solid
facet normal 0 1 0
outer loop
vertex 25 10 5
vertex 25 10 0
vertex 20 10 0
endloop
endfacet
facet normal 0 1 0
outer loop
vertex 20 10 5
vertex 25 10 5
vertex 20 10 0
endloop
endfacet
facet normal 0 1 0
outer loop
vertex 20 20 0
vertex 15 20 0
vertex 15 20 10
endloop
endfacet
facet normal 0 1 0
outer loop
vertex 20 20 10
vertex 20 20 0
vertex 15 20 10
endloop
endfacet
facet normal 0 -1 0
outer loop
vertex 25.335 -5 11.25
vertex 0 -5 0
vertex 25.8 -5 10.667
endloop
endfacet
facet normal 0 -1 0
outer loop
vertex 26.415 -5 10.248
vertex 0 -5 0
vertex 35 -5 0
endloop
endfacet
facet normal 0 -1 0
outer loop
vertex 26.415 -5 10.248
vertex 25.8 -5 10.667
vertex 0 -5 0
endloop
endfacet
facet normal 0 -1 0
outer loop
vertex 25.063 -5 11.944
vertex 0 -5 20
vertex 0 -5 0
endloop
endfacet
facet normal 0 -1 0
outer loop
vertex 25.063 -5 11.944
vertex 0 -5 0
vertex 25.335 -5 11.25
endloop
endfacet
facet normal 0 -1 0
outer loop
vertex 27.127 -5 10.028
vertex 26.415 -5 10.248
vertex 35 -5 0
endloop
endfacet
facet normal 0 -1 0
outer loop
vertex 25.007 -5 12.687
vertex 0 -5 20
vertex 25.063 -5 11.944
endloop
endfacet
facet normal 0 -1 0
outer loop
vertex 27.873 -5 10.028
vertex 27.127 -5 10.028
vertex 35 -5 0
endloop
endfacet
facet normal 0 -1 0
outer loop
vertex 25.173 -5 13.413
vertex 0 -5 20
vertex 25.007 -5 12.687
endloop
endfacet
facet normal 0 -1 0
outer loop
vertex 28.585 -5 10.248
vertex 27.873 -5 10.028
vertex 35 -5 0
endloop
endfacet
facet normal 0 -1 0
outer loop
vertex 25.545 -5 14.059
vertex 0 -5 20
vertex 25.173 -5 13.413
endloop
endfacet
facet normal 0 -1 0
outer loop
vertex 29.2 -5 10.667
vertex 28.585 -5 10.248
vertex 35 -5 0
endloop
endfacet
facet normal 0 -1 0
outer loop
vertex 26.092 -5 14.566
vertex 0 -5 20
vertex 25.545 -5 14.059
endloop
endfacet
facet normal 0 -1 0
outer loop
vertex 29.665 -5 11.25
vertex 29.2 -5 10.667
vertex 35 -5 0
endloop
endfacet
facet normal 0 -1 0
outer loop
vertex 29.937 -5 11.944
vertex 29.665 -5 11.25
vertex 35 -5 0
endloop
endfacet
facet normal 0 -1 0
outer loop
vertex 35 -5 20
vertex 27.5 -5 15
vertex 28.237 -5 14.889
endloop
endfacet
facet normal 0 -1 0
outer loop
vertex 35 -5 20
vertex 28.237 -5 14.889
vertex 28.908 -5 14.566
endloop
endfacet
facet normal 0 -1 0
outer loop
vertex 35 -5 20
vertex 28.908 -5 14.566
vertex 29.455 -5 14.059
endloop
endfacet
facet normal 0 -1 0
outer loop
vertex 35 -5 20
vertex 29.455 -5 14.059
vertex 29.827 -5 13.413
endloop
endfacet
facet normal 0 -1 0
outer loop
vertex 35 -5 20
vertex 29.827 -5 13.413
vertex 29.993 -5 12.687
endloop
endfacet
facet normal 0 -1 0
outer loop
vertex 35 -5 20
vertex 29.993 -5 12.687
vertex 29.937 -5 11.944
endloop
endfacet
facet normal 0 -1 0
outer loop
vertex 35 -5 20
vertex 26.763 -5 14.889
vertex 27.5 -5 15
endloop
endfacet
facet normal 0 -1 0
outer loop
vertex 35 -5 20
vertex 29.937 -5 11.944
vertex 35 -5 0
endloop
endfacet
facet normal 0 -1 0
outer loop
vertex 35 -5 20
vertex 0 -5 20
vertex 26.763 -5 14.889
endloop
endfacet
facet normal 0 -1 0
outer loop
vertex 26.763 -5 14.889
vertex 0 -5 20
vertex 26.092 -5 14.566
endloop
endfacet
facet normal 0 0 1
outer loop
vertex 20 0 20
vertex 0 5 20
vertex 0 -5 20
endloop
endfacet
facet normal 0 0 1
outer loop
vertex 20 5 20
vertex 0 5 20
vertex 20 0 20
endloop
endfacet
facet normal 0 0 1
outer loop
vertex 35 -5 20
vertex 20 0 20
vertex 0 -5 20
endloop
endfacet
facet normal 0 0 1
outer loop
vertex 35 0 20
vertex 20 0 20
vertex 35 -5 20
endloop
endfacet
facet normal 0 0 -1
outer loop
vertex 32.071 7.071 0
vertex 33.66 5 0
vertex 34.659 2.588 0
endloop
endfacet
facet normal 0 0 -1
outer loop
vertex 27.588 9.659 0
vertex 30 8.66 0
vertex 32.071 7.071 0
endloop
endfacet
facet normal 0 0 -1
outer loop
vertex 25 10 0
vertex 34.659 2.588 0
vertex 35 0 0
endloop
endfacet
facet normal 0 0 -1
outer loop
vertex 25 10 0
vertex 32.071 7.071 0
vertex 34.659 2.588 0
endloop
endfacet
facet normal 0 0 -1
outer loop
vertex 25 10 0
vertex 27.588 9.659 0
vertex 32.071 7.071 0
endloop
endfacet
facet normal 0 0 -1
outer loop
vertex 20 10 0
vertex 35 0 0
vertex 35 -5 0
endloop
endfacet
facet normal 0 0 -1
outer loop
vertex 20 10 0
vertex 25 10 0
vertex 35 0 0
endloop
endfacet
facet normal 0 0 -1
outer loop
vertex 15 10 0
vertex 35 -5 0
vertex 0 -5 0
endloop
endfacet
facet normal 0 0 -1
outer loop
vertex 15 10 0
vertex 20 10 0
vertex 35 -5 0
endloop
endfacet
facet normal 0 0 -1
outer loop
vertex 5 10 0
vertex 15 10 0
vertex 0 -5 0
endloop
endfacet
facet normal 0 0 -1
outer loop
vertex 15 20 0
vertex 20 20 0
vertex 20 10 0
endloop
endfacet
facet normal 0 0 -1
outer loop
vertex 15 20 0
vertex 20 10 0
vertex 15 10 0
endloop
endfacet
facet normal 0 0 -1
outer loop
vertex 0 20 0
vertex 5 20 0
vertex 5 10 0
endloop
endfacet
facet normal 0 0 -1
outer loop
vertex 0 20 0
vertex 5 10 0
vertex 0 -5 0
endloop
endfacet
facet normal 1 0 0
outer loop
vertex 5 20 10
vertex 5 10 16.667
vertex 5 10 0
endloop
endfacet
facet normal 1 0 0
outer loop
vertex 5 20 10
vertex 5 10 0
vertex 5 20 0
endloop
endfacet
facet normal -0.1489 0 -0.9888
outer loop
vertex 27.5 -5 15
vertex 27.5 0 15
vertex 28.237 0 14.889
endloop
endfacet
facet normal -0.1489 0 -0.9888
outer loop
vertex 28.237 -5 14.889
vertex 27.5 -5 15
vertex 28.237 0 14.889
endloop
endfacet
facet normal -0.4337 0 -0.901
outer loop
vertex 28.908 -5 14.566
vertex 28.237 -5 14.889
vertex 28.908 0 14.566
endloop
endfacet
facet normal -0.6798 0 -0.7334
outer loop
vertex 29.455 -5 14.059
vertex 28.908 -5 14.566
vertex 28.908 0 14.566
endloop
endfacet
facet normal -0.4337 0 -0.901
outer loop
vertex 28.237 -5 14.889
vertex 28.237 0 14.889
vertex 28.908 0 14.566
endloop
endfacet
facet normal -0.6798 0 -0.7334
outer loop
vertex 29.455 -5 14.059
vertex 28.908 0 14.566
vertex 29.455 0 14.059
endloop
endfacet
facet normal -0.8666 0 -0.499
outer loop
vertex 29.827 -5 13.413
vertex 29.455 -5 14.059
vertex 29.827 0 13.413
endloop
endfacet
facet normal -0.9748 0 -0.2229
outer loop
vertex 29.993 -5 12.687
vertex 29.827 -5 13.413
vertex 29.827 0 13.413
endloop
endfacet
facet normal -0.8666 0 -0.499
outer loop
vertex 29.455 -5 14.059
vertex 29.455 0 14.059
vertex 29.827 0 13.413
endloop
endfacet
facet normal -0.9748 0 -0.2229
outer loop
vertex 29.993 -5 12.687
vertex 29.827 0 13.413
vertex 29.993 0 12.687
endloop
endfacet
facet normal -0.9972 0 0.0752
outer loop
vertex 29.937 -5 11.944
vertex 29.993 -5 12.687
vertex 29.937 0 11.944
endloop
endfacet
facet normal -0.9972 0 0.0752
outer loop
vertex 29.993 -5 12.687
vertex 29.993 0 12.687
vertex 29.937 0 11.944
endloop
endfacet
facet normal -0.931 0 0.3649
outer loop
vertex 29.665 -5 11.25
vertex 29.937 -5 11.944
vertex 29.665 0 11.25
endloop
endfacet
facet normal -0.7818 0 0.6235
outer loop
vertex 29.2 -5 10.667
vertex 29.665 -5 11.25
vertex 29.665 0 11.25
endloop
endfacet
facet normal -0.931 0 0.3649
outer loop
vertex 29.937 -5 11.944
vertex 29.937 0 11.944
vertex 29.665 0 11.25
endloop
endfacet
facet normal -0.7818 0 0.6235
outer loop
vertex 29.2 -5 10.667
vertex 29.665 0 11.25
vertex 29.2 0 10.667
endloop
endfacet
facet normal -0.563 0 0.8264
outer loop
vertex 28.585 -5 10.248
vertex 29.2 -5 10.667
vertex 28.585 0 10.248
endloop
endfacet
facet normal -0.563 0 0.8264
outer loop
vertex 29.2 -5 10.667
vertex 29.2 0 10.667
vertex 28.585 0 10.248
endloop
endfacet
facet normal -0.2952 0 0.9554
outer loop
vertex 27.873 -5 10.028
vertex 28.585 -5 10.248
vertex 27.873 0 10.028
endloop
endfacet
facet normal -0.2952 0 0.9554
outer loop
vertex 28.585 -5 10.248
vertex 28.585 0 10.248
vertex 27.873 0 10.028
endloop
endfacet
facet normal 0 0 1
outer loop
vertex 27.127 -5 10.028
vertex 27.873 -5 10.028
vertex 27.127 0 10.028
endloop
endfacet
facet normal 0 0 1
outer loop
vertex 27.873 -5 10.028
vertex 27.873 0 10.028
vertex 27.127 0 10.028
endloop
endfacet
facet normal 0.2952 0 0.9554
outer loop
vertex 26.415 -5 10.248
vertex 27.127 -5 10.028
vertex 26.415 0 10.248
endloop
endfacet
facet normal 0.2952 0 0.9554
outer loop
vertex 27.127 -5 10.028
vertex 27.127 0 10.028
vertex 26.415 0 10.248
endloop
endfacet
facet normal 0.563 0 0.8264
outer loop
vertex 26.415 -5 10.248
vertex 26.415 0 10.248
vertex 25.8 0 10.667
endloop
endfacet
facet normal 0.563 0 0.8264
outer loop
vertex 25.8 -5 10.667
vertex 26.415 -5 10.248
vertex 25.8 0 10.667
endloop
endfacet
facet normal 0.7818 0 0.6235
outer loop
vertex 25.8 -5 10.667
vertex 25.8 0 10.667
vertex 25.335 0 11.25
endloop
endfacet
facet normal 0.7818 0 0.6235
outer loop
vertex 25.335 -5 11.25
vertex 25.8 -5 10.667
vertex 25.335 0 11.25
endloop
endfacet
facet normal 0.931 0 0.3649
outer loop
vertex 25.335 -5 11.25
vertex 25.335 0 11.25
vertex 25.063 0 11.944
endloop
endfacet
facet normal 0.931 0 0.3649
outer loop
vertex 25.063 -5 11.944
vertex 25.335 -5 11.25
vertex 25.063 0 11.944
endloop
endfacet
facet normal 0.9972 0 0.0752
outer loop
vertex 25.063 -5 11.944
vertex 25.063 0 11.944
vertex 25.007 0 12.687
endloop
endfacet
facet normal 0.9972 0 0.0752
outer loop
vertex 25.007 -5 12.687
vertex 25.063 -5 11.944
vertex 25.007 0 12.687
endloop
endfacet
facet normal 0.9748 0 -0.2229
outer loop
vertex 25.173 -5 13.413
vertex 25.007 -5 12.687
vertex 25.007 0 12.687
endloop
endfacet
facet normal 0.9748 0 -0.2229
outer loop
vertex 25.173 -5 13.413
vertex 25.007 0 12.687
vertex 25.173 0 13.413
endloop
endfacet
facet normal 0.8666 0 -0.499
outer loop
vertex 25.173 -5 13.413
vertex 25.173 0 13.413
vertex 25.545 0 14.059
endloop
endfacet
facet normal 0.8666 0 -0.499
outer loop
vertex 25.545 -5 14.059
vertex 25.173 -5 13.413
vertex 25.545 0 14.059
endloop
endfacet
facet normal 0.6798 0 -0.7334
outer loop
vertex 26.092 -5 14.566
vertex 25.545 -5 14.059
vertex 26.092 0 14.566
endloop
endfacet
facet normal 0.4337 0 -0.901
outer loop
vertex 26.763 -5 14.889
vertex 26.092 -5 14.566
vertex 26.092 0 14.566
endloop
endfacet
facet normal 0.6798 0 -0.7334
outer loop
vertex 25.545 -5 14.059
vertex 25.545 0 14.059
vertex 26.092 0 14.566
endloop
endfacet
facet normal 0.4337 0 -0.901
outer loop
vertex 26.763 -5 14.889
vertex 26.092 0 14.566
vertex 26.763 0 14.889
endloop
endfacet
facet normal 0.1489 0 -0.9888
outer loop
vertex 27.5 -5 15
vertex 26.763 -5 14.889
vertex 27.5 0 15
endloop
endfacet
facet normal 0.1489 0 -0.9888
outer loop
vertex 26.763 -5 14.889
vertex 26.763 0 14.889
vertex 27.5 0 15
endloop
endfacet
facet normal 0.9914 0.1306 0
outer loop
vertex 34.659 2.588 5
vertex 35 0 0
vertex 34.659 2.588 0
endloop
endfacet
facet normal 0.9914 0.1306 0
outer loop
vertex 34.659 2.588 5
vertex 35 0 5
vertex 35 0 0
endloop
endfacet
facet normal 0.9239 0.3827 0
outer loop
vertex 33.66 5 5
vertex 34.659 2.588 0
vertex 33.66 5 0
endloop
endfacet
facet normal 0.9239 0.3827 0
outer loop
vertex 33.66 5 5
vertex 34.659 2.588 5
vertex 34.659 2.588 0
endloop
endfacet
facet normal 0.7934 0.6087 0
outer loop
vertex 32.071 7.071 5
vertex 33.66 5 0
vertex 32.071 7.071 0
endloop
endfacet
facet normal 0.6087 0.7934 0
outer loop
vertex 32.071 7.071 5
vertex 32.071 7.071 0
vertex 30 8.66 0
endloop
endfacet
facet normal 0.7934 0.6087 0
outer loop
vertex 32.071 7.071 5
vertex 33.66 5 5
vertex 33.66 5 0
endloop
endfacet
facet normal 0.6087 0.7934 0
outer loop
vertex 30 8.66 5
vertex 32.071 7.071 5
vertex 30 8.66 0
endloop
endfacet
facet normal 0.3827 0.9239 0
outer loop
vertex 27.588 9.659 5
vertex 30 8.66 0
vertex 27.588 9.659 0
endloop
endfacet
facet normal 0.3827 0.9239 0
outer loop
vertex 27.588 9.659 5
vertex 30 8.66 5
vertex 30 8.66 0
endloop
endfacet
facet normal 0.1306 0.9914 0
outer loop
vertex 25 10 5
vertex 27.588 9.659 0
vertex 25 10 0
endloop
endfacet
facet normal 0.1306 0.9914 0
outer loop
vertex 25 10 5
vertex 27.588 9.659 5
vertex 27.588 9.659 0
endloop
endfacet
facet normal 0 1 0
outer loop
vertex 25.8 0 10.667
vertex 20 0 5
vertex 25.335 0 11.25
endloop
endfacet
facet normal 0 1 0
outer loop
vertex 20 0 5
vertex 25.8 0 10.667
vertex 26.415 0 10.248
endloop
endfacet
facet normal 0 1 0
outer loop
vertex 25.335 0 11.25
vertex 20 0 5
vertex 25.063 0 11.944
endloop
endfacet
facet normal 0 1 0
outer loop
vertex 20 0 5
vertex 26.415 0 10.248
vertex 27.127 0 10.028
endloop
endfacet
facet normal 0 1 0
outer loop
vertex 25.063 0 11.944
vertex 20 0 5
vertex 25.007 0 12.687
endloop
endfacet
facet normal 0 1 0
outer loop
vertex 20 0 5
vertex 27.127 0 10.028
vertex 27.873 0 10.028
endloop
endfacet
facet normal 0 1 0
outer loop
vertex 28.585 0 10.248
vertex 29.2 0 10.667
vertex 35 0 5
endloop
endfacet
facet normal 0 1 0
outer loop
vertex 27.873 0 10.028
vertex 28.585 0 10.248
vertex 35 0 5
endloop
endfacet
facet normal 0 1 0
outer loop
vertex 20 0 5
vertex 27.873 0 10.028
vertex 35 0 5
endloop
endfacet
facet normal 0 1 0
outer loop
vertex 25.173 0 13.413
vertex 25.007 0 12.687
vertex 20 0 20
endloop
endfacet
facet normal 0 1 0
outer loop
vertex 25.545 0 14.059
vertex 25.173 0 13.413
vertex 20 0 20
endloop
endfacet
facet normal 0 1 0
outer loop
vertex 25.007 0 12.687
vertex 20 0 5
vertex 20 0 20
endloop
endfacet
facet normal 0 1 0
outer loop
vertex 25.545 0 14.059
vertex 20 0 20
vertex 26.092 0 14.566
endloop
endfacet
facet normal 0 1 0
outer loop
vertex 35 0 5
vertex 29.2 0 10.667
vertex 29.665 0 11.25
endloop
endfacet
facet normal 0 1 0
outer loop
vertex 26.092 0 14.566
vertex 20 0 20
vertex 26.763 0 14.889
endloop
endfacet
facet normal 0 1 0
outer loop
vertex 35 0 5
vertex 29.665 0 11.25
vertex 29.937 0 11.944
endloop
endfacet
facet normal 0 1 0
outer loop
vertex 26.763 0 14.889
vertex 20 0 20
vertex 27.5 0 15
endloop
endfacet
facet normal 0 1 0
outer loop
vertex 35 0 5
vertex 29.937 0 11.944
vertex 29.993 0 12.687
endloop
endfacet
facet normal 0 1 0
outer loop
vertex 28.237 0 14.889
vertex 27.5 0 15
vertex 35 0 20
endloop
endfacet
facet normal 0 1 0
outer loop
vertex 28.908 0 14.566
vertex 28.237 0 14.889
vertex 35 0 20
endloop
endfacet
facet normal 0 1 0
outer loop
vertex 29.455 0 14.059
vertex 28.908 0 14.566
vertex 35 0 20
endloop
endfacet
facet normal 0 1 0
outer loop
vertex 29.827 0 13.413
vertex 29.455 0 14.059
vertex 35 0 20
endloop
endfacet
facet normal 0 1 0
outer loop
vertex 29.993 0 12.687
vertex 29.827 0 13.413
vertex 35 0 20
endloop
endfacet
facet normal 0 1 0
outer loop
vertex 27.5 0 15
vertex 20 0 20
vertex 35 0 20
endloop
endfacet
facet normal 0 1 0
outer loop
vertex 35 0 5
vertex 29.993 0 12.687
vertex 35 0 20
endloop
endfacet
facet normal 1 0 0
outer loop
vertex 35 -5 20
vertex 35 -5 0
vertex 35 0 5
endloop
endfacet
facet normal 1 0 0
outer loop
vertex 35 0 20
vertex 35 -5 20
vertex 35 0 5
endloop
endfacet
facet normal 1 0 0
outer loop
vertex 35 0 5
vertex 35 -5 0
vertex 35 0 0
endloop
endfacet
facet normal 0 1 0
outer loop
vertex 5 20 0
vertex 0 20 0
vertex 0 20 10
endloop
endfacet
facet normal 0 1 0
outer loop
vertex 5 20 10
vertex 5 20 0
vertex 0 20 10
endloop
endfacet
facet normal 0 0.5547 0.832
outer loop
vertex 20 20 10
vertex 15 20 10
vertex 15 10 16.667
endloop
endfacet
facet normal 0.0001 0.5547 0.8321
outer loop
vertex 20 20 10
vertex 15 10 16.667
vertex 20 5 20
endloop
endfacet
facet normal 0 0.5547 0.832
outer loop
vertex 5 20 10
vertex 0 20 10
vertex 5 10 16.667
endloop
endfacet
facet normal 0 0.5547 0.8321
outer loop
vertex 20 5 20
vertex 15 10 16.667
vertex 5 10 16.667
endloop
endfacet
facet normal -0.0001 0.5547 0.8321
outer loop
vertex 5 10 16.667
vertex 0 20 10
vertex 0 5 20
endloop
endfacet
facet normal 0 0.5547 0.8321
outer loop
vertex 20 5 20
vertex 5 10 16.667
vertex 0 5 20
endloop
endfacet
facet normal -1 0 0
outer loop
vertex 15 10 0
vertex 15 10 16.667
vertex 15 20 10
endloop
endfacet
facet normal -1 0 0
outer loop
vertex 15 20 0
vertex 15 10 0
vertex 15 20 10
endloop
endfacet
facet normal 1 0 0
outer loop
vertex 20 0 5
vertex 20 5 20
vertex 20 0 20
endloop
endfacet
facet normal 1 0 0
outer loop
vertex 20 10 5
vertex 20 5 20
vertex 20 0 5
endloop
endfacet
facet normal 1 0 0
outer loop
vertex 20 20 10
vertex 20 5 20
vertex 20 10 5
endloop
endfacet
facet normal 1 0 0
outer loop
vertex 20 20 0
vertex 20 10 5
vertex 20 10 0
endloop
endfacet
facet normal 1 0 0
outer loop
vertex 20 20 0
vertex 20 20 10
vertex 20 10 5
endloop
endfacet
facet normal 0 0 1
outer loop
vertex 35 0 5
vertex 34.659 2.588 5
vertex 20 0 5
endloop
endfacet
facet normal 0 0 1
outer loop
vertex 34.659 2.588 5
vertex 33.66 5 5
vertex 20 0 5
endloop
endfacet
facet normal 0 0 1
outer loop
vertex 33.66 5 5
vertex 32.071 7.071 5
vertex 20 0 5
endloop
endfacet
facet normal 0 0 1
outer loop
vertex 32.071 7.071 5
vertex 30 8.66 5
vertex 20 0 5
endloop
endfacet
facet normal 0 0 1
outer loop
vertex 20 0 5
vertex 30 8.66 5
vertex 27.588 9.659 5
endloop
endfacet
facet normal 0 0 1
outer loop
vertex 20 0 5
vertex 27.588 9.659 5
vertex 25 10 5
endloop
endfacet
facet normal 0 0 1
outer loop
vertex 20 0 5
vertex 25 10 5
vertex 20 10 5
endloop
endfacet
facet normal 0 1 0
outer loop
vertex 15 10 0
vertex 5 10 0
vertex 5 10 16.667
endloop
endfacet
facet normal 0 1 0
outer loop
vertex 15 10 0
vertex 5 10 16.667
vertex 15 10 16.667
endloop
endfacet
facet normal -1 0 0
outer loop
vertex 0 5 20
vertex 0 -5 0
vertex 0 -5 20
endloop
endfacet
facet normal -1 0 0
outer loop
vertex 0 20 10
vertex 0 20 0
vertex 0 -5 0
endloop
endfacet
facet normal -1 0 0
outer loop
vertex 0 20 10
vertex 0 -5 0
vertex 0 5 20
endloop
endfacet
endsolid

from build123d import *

# Parameters (mm, degrees)
EXTRUDE_1_DEPTH          = 20
SKETCH_3_W               = 35
SKETCH_3_H               = 20
EXTRUDE_2_DEPTH          = 5
SKETCH_4_W               = 15
SKETCH_4_H               = 10
EXTRUDE_3_DEPTH          = 5
FILLET_1_R               = 10
CUT_EXTRUDE_1_DEPTH      = 46
CUT_EXTRUDE_1_DEPTH_BACK = 46
SKETCH_5_W               = 10
SKETCH_5_H               = 20
SKETCH_6_R               = 2.5
CUT_EXTRUDE_2_DEPTH      = 5


with BuildPart() as part:
    # 草圖1 → 填料-伸長1 (new body)
    with BuildSketch(Plane(origin=(0, 0, 0), x_dir=(0, 0, -1), z_dir=(1, 0, 0))):
        Polygon((-10, 20), (-20, 5), (-20, 0), (0, 0), (0, 20), align=None)
    extrude(amount=EXTRUDE_1_DEPTH)

    # 草圖3 → 填料-伸長2 (add)
    with BuildSketch(Plane.XZ):
        with Locations((17.5, 10)):
            Rectangle(SKETCH_3_W, SKETCH_3_H)
    extrude(amount=EXTRUDE_2_DEPTH)

    # 草圖4 → 填料-伸長3 (add)
    with BuildSketch(Plane(origin=(0, 0, 0), x_dir=(-1, 0, 0), z_dir=(0, 0, -1))):
        with Locations((-27.5, 5)):
            Rectangle(SKETCH_4_W, SKETCH_4_H)
    extrude(amount=-EXTRUDE_3_DEPTH)

    # 圓角1
    fillet_1_edges = [part.edges().sort_by_distance(p)[0] for p in [
        (35, 10, 2.5),
    ]]
    fillet(fillet_1_edges, radius=FILLET_1_R)

    # 草圖5 → 除料-伸長1 (cut, two sides: drawn at the far end of the back side and taken through both)
    with BuildSketch(Plane.XY.offset(-CUT_EXTRUDE_1_DEPTH_BACK)):
        with Locations((10, 20)):
            Rectangle(SKETCH_5_W, SKETCH_5_H)
    extrude(amount=CUT_EXTRUDE_1_DEPTH + CUT_EXTRUDE_1_DEPTH_BACK, mode=Mode.SUBTRACT)

    # 草圖6 → 除料-伸長2 (cut)
    with BuildSketch(Plane(origin=(0, 0, 0), x_dir=(1, 0, 0), z_dir=(0, 1, 0))):
        with Locations(Location((27.5, -12.5, 0), (0, 0, 270))):
            Circle(SKETCH_6_R)
    extrude(amount=-CUT_EXTRUDE_2_DEPTH, mode=Mode.SUBTRACT)


solid = part.part
